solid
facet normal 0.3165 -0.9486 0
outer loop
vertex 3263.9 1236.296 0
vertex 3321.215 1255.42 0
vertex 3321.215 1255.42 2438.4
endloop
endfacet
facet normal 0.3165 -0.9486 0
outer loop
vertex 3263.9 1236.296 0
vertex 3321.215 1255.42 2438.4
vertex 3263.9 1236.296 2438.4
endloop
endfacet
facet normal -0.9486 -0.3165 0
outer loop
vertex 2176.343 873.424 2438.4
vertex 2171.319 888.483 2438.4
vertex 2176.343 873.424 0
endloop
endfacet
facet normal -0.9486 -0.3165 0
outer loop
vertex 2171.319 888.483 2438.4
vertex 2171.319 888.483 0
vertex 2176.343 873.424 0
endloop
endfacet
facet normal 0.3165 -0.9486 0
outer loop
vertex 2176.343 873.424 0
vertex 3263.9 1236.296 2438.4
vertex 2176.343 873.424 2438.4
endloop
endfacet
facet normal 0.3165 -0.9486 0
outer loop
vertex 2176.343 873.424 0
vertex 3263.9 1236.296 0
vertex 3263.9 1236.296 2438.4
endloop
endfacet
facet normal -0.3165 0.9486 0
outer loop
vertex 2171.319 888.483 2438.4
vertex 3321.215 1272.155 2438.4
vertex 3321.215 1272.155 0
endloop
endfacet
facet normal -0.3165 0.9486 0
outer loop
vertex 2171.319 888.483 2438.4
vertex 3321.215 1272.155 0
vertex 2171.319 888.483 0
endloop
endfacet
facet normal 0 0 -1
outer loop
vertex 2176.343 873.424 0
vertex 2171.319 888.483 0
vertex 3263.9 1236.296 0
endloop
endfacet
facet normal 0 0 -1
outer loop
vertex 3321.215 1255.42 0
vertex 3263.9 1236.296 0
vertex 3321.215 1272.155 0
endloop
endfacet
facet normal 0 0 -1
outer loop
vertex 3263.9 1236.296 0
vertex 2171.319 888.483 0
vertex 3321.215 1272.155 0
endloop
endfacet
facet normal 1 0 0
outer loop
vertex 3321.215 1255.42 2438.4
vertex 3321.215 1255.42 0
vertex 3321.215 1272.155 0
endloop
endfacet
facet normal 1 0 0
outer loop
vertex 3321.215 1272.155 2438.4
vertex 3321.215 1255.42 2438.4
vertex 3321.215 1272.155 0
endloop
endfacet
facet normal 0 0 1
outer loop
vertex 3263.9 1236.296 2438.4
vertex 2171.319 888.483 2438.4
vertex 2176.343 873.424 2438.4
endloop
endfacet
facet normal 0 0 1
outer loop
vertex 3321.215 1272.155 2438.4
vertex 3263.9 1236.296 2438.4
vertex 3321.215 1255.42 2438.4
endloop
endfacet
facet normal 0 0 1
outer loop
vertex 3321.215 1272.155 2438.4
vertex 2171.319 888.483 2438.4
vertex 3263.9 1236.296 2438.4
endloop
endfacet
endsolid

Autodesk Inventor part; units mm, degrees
ref_plane "YZ Plane" through (0, 0, 0) normal (1, 0, 0) x (0, 1, 0)
ref_plane "XZ Plane" through (0, 0, 0) normal (0, 1, 0) x (-1, 0, 0)
sketch "Sketch1" plane through (0, 0, 0) normal (0, 0, 1) x (1, 0, 0)
  line L0 (0, 0) -> (3321.2151, 1108.1486)
  line L1 (3321.2151, 1255.4197) -> (-135.0962, 102.1952)
  line L2 (0, 0) -> (-135.0962, 0)
  line L3 (-135.0962, 0) -> (-135.0962, 102.1952)
  line L4 (-135.0962, 102.1952) -> (1593.1098, 678.8242)
  line L5 (3321.2151, 1108.1486) -> (3263.9, 1108.1486)
  line L6 (3321.2151, 1108.1486) -> (3321.2151, 1255.4197)
  line L7 (-88.9, 0) -> (-88.9, 117.6089)
  line L8 (3263.9, 1089.025) -> (3263.9, 1236.2961)
  line L9 (-135.0962, 102.1952) -> (-135.0962, 118.9305)
  line L10 (-135.0962, 118.9305) -> (1016.4014, 503.1364)
  line L11 (1016.4014, 503.1364) -> (1021.4259, 488.0776)
  line L12 (1021.4259, 488.0776) -> (-135.0962, 102.1952)
  line L13 (-135.0962, 102.1952) -> (-100.9981, 0)
  line L14 (3321.2151, 1255.4197) -> (3321.2151, 1272.155)
  line L15 (3321.2151, 1272.155) -> (2171.3189, 888.4834)
  line L16 (2171.3189, 888.4834) -> (2176.3434, 873.4245)
  dimension "d5" = 139.7
  dimension "d17" = 88.9
  dimension "d19" = 3352.8
  dimension "d23" = 57.3151
  dimension "d28" = 46.1962
  dimension "d33" = 1089.025
  dimension "d36" = 15.875
  dimension "d37" = 1219.2
  dimension "d41" = 15.875
  dimension "d42" = 1212.215
extrude "Extrusion2" add sketch "Sketch1" along normal blind 2438.4 contours L1 L16 L15 L14
ref_plane "Work Plane2" through (-135.0962, 102.1952, 0) normal (-0.9486, -0.3165, 0) x (0.3165, -0.9486, 0)
properties part number "OSB_For_Front_Roof" material "Wood (Birch)"
